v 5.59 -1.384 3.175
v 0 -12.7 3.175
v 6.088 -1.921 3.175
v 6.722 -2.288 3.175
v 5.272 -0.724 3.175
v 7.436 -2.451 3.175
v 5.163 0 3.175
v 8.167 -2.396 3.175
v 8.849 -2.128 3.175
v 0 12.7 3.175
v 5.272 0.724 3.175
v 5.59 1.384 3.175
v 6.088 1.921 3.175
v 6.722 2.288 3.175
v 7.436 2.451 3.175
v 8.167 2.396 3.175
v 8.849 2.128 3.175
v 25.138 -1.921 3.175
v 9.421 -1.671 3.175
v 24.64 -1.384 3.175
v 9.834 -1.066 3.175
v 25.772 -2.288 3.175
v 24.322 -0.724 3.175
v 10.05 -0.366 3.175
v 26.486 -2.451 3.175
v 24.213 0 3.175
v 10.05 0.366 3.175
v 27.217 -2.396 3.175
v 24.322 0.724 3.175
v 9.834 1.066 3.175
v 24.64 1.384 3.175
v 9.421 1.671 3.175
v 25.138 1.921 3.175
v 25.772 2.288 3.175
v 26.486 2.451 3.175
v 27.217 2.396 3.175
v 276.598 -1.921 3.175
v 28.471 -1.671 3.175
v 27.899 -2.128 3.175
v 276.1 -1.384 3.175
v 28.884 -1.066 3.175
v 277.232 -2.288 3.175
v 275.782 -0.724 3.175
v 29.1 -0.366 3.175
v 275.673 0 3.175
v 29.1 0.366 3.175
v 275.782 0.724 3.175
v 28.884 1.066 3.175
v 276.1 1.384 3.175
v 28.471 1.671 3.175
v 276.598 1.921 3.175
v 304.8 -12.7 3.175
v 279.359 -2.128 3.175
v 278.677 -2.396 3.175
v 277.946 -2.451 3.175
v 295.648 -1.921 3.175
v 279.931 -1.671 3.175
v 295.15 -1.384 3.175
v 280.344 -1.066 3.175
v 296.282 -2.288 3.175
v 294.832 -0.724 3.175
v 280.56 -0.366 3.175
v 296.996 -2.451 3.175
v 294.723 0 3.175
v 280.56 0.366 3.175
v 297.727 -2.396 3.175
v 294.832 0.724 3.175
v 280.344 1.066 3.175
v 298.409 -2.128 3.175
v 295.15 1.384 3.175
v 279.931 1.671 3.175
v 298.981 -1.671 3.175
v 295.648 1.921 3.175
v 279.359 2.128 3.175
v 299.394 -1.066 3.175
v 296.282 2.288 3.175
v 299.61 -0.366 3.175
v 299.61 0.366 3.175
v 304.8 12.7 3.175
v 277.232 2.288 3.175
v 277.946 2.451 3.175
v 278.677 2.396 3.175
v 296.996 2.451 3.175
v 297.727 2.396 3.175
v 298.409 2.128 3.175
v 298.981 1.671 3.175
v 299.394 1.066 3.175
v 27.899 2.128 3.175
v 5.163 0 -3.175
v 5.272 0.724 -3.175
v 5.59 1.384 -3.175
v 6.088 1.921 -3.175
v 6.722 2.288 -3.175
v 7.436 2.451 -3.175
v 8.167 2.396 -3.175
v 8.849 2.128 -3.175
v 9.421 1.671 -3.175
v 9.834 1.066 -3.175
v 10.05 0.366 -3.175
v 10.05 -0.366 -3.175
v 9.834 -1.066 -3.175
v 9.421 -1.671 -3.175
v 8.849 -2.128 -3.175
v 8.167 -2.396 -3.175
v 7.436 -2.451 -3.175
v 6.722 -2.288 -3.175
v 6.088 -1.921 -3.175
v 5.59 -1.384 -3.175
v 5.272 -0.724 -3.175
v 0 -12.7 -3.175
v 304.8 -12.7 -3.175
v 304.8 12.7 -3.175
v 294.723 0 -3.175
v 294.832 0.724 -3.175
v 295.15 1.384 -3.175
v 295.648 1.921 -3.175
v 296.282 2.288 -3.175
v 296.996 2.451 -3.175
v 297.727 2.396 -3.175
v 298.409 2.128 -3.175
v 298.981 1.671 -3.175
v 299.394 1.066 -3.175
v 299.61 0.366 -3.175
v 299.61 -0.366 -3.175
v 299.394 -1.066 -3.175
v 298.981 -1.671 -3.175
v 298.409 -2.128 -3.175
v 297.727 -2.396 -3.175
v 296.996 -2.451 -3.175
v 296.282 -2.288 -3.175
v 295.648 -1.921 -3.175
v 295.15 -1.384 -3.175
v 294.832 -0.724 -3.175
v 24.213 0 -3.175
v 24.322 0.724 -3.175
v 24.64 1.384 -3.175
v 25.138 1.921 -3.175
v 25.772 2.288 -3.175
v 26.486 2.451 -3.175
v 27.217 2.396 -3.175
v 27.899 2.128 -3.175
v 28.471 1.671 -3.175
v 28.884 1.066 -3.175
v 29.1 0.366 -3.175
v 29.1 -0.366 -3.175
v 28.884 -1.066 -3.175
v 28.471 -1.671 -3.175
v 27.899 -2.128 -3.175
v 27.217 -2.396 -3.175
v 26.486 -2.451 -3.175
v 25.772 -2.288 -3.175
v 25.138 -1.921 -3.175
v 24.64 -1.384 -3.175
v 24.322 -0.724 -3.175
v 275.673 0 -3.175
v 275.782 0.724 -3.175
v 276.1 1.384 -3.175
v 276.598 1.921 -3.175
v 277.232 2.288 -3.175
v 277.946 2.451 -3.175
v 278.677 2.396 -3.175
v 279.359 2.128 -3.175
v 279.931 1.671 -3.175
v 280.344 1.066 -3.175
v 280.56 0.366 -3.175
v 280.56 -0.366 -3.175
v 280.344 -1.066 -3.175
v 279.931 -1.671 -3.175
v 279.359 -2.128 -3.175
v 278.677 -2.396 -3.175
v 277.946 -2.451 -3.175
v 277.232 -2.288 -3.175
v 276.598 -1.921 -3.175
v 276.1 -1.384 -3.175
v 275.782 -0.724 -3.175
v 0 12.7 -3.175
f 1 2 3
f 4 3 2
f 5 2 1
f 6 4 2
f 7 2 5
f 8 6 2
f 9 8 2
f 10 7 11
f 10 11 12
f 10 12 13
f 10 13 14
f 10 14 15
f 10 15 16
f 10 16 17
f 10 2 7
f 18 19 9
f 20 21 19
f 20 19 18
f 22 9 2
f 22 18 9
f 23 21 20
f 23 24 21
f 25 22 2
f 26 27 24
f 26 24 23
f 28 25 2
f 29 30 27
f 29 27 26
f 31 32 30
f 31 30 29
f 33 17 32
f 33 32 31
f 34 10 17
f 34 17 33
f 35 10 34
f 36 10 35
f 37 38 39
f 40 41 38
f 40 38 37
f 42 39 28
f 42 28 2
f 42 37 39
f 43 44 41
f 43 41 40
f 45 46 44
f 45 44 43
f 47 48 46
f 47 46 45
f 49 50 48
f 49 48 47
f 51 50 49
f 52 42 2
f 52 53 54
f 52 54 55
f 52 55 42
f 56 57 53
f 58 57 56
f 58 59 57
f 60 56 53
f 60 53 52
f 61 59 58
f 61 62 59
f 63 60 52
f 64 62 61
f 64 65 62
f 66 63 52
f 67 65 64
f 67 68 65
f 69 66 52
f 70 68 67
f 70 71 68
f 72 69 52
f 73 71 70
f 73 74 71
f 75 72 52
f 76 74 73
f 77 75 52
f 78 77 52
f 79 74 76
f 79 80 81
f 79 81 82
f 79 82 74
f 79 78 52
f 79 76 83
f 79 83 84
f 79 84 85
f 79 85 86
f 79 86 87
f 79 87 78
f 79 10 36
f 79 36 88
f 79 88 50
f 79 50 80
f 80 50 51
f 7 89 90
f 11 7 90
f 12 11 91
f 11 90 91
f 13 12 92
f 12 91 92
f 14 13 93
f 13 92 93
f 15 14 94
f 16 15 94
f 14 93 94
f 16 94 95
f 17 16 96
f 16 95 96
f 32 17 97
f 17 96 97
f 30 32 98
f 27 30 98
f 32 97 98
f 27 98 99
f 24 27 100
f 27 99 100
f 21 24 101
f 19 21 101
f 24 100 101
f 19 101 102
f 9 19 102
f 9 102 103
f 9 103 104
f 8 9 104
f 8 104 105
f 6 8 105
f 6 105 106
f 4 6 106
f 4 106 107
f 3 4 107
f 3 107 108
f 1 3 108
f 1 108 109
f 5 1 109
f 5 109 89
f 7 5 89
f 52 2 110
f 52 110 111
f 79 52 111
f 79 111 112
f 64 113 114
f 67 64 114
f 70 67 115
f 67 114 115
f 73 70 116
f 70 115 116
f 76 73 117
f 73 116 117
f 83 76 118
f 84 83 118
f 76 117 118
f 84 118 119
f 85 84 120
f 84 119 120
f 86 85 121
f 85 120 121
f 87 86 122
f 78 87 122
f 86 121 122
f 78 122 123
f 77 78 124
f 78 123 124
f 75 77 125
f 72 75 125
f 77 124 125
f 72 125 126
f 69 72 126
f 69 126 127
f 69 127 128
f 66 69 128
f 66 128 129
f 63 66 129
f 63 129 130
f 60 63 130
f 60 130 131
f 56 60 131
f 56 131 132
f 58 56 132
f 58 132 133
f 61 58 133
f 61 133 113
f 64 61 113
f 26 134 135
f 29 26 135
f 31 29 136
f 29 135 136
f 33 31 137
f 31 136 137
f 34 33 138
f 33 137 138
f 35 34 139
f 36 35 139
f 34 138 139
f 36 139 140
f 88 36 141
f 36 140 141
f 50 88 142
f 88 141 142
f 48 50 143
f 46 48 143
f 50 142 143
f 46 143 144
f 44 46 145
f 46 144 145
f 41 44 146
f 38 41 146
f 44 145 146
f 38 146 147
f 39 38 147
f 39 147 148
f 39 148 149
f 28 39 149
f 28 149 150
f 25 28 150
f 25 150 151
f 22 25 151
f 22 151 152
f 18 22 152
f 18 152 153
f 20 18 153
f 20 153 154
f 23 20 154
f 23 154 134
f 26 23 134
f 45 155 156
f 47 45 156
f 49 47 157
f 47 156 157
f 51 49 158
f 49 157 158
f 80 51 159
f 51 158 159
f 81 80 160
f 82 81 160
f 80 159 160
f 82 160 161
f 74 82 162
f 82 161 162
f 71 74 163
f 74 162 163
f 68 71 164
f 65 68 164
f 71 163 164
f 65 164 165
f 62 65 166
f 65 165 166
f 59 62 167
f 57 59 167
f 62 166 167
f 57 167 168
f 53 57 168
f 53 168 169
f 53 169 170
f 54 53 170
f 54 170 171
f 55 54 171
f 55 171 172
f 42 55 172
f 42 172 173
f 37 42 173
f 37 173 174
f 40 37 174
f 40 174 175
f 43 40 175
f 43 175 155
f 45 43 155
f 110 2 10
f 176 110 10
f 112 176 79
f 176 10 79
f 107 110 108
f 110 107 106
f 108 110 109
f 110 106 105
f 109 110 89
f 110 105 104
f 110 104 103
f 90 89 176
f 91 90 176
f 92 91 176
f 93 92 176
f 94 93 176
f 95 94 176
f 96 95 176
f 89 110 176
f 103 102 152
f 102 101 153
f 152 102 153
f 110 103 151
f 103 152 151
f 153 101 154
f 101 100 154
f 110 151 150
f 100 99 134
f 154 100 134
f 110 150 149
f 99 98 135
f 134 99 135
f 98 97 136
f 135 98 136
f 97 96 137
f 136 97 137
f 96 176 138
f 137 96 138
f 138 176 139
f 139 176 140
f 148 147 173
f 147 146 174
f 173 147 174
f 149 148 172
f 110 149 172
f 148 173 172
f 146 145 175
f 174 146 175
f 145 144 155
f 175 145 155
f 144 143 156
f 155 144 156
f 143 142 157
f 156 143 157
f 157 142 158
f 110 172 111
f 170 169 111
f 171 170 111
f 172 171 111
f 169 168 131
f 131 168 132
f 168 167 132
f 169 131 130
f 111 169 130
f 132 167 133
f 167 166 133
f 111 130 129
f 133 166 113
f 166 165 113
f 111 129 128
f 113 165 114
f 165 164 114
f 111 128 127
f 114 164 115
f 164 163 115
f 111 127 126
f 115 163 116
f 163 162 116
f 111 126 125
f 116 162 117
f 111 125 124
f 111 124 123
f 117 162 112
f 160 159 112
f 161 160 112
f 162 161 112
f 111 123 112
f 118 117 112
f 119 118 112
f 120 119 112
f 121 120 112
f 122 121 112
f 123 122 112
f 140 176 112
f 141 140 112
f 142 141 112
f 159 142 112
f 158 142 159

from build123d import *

# Parameters (mm, degrees)
SKETCH1_W                        = 304.8
SKETCH1_H                        = 25.4
BOSS_EXTRUDE1_DEPTH              = 3.175
F_10_0_1935_DIAMETER_HOLE1_D     = 4.9149
F_10_0_1935_DIAMETER_HOLE1_DEPTH = 11.938
F_10_0_1935_DIAMETER_HOLE1_TIP   = 1.476584928


with BuildPart() as part:
    # Sketch1 → Boss-Extrude1 (new body, symmetric)
    with BuildSketch(Plane.XY):
        with Locations((152.4, 0)):
            Rectangle(SKETCH1_W, SKETCH1_H)
    extrude(amount=BOSS_EXTRUDE1_DEPTH, both=True)

    # #10 (0.1935) Diameter Hole1
    with Locations(Plane.XY.offset(3.175)):
        with Locations((7.62, 0), (26.67, 0), (278.13, 0), (297.18, 0)):
            Hole(F_10_0_1935_DIAMETER_HOLE1_D / 2, depth=F_10_0_1935_DIAMETER_HOLE1_DEPTH)
            with Locations((0, 0, -(F_10_0_1935_DIAMETER_HOLE1_DEPTH + F_10_0_1935_DIAMETER_HOLE1_TIP / 2))):  # 118° drill point
                Cone(0, F_10_0_1935_DIAMETER_HOLE1_D / 2, F_10_0_1935_DIAMETER_HOLE1_TIP, mode=Mode.SUBTRACT)


solid = part.part
